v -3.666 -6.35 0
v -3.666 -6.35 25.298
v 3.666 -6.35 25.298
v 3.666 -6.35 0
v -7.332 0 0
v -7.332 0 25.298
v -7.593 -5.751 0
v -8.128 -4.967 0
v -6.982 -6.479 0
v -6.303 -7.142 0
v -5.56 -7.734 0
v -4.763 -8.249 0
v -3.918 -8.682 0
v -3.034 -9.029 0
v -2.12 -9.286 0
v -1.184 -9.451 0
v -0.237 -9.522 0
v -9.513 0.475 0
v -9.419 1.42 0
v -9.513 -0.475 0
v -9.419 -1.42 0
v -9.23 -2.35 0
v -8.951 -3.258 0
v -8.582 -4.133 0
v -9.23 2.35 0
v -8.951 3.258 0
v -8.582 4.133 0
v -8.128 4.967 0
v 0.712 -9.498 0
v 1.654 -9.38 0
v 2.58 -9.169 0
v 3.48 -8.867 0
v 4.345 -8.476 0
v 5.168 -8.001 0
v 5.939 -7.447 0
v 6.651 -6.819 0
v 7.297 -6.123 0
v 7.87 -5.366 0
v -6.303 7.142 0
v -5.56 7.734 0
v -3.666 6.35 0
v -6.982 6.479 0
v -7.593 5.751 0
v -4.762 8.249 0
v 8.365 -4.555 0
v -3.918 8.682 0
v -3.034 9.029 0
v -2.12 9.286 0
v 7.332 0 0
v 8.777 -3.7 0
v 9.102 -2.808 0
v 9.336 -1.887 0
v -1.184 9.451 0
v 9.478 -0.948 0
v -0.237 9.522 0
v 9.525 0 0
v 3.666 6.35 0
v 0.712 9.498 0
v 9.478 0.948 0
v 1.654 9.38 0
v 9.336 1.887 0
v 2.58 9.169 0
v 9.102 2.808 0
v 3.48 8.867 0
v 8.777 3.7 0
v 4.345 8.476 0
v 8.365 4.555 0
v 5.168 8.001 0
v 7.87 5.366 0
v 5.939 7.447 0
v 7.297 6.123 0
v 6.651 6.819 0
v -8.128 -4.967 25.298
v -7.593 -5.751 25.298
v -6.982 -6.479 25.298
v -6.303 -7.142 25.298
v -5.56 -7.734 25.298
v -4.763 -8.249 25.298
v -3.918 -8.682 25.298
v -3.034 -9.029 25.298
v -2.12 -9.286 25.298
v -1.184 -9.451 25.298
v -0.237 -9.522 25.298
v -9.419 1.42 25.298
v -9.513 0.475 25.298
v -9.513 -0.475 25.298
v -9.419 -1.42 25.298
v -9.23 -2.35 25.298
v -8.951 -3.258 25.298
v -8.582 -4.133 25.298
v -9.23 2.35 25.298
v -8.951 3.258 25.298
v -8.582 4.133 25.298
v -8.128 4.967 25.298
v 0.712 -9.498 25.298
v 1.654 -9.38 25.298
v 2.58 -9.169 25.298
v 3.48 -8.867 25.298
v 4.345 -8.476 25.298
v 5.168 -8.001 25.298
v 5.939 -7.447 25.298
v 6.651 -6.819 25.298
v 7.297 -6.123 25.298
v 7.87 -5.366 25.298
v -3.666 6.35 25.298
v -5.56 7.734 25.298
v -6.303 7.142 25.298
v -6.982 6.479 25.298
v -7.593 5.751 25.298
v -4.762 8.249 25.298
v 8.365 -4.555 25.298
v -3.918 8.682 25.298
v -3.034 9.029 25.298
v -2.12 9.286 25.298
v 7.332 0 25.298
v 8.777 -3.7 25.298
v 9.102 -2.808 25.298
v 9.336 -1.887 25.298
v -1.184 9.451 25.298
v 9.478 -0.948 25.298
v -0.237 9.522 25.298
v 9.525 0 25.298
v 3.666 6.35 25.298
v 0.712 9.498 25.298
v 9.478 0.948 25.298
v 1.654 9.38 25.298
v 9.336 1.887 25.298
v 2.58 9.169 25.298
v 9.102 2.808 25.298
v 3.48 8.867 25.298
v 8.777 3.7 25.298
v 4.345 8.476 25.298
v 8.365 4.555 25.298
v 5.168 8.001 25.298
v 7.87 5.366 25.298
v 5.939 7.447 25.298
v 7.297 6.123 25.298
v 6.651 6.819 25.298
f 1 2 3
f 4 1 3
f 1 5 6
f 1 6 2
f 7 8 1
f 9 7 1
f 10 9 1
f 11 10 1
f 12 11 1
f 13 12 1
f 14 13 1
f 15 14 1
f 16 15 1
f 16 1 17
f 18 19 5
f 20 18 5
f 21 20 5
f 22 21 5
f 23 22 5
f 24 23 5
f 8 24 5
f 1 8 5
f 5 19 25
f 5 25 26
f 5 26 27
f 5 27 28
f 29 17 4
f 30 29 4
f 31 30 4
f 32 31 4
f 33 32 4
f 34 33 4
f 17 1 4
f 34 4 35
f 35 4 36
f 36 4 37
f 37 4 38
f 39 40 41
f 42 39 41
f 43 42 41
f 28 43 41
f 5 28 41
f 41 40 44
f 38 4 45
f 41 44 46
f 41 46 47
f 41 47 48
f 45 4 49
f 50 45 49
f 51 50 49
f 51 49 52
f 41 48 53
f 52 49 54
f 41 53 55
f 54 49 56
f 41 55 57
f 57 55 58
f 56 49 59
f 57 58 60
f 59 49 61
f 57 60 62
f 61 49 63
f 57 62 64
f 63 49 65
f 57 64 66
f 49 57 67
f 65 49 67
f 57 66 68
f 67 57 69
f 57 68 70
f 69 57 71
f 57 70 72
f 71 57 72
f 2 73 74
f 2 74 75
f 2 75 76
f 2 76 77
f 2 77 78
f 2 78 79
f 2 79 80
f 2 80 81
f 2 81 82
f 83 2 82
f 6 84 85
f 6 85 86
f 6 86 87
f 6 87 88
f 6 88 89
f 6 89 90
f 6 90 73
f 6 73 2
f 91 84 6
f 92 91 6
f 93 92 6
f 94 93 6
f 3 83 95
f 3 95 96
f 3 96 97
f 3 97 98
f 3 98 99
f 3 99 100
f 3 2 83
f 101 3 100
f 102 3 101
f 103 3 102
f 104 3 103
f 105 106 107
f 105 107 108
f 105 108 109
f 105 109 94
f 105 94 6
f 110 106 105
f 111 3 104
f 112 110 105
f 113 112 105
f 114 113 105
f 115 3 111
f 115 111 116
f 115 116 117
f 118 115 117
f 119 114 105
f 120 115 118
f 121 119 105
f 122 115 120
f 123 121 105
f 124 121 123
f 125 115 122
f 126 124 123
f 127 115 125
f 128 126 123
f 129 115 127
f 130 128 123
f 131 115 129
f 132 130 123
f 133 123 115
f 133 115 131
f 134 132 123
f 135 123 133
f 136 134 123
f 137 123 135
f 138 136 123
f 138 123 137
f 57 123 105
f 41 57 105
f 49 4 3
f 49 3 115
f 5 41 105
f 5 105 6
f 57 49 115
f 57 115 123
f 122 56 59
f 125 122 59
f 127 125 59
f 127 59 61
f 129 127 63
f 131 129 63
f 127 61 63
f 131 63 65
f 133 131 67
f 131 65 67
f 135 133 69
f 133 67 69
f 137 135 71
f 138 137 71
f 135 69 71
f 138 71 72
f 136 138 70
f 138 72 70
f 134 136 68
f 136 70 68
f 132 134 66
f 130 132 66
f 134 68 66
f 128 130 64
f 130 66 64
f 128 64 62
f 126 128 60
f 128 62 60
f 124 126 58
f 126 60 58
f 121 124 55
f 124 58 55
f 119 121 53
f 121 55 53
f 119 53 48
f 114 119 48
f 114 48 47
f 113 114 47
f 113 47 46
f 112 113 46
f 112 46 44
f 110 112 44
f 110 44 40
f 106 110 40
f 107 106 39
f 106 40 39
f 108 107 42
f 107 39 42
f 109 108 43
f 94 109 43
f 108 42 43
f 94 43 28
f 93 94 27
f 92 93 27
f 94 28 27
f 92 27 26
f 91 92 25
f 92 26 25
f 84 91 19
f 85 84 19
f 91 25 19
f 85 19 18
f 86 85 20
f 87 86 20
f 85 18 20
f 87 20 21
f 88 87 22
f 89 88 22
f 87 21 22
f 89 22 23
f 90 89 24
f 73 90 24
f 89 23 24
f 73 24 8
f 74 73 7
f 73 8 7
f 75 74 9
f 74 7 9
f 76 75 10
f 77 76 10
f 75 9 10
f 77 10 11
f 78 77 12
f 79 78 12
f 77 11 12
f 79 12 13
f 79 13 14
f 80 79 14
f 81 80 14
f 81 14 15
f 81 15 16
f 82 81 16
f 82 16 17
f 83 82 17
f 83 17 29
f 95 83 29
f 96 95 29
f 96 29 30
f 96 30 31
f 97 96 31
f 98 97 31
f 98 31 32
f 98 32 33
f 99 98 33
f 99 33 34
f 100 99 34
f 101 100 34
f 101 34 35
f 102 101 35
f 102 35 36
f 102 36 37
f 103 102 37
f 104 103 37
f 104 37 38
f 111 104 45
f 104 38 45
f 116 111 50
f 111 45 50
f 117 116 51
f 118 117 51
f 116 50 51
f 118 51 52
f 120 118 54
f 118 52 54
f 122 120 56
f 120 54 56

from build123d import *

# Parameters (mm, degrees)
SKETCH1_R           = 9.525
BOSS_EXTRUDE1_DEPTH = 25.2984


with BuildPart() as part:
    # Sketch1 → Boss-Extrude1 (new body)
    with BuildSketch(Plane.XY):
        Circle(SKETCH1_R)
        Polygon((-3.666174209, 6.35), (-7.332348419, 0), (-3.666174209, -6.35), (3.666174209, -6.35), (7.332348419, 0), (3.666174209, 6.35), align=None, mode=Mode.SUBTRACT)
    extrude(amount=BOSS_EXTRUDE1_DEPTH)


solid = part.part
